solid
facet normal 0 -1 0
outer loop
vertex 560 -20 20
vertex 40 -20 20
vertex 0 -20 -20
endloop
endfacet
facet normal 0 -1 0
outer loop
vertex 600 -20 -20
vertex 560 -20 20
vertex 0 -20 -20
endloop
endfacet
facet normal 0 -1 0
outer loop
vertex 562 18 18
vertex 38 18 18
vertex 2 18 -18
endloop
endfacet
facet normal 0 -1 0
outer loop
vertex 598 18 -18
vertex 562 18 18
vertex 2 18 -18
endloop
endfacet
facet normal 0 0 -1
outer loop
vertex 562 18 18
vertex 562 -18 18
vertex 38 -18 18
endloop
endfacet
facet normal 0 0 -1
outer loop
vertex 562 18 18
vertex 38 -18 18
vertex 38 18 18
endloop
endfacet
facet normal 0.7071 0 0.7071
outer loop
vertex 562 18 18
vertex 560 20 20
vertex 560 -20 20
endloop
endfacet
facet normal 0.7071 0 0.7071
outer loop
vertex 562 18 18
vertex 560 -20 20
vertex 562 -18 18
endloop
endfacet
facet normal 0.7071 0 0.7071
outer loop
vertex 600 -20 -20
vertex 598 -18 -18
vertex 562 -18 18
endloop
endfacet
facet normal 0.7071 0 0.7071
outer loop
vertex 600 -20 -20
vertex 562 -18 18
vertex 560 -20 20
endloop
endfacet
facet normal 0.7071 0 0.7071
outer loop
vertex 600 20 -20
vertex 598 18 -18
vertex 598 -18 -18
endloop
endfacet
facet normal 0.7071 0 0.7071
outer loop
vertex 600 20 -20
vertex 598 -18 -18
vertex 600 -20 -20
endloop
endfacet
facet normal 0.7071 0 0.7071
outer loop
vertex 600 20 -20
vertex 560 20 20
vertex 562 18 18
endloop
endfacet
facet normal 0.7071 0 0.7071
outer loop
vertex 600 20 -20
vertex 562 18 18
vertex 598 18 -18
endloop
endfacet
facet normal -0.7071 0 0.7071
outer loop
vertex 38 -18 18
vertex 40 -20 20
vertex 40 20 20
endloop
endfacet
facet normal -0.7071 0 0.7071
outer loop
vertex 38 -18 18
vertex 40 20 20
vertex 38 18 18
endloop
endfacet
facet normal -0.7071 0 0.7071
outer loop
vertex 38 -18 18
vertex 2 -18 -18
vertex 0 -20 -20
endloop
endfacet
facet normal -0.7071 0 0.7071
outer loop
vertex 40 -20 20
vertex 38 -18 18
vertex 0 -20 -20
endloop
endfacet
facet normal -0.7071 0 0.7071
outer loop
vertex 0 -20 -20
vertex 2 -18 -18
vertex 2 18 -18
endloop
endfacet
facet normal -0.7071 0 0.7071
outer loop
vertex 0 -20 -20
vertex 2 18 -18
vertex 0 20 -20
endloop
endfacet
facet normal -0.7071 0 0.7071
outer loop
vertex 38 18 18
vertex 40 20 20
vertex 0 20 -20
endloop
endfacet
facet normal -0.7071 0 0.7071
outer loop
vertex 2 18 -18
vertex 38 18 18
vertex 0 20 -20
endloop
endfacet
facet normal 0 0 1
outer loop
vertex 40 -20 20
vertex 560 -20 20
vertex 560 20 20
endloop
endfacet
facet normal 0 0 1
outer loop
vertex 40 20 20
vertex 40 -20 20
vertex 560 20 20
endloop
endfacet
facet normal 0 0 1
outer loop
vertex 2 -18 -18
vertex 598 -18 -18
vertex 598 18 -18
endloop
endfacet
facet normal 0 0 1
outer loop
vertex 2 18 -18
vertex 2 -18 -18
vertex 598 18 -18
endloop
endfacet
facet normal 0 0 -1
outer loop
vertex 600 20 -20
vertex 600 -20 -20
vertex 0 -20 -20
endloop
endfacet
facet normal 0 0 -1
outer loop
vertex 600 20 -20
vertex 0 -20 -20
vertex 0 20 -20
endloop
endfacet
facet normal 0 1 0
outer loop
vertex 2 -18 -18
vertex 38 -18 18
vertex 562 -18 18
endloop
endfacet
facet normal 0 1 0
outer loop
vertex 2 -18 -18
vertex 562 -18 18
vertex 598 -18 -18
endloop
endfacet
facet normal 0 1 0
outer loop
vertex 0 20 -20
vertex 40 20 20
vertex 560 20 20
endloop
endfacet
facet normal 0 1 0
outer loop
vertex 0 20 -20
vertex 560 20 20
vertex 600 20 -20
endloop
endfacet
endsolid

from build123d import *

# Parameters (mm, degrees)
CROQUIS1_W              = 40
CROQUIS1_H              = 40
CROQUIS1_W_2            = 36
CROQUIS1_H_2            = 36
SALIENTE_EXTRUIR1_DEPTH = 600
CORTAR_EXTRUIR2_DEPTH   = 41


with BuildPart() as part:
    # Croquis1 → Saliente-Extruir1 (new body)
    with BuildSketch(Plane(origin=(0, 0, 0), x_dir=(0, 0, -1), z_dir=(1, 0, 0))):
        Rectangle(CROQUIS1_W, CROQUIS1_H)
        Rectangle(CROQUIS1_W_2, CROQUIS1_H_2, mode=Mode.SUBTRACT)
    extrude(amount=SALIENTE_EXTRUIR1_DEPTH)

    # Croquis2 → Cortar-Extruir2 (cut, through all)
    with BuildSketch(Plane(origin=(0, 20, 0), x_dir=(1, 0, 0), z_dir=(0, 1, 0))):
        Polygon((0, 20), (0, -20), (40, -20), align=None)
        Polygon((560, -20), (600, 20), (600, -20), align=None)
    extrude(amount=-CORTAR_EXTRUIR2_DEPTH, mode=Mode.SUBTRACT)


solid = part.part
